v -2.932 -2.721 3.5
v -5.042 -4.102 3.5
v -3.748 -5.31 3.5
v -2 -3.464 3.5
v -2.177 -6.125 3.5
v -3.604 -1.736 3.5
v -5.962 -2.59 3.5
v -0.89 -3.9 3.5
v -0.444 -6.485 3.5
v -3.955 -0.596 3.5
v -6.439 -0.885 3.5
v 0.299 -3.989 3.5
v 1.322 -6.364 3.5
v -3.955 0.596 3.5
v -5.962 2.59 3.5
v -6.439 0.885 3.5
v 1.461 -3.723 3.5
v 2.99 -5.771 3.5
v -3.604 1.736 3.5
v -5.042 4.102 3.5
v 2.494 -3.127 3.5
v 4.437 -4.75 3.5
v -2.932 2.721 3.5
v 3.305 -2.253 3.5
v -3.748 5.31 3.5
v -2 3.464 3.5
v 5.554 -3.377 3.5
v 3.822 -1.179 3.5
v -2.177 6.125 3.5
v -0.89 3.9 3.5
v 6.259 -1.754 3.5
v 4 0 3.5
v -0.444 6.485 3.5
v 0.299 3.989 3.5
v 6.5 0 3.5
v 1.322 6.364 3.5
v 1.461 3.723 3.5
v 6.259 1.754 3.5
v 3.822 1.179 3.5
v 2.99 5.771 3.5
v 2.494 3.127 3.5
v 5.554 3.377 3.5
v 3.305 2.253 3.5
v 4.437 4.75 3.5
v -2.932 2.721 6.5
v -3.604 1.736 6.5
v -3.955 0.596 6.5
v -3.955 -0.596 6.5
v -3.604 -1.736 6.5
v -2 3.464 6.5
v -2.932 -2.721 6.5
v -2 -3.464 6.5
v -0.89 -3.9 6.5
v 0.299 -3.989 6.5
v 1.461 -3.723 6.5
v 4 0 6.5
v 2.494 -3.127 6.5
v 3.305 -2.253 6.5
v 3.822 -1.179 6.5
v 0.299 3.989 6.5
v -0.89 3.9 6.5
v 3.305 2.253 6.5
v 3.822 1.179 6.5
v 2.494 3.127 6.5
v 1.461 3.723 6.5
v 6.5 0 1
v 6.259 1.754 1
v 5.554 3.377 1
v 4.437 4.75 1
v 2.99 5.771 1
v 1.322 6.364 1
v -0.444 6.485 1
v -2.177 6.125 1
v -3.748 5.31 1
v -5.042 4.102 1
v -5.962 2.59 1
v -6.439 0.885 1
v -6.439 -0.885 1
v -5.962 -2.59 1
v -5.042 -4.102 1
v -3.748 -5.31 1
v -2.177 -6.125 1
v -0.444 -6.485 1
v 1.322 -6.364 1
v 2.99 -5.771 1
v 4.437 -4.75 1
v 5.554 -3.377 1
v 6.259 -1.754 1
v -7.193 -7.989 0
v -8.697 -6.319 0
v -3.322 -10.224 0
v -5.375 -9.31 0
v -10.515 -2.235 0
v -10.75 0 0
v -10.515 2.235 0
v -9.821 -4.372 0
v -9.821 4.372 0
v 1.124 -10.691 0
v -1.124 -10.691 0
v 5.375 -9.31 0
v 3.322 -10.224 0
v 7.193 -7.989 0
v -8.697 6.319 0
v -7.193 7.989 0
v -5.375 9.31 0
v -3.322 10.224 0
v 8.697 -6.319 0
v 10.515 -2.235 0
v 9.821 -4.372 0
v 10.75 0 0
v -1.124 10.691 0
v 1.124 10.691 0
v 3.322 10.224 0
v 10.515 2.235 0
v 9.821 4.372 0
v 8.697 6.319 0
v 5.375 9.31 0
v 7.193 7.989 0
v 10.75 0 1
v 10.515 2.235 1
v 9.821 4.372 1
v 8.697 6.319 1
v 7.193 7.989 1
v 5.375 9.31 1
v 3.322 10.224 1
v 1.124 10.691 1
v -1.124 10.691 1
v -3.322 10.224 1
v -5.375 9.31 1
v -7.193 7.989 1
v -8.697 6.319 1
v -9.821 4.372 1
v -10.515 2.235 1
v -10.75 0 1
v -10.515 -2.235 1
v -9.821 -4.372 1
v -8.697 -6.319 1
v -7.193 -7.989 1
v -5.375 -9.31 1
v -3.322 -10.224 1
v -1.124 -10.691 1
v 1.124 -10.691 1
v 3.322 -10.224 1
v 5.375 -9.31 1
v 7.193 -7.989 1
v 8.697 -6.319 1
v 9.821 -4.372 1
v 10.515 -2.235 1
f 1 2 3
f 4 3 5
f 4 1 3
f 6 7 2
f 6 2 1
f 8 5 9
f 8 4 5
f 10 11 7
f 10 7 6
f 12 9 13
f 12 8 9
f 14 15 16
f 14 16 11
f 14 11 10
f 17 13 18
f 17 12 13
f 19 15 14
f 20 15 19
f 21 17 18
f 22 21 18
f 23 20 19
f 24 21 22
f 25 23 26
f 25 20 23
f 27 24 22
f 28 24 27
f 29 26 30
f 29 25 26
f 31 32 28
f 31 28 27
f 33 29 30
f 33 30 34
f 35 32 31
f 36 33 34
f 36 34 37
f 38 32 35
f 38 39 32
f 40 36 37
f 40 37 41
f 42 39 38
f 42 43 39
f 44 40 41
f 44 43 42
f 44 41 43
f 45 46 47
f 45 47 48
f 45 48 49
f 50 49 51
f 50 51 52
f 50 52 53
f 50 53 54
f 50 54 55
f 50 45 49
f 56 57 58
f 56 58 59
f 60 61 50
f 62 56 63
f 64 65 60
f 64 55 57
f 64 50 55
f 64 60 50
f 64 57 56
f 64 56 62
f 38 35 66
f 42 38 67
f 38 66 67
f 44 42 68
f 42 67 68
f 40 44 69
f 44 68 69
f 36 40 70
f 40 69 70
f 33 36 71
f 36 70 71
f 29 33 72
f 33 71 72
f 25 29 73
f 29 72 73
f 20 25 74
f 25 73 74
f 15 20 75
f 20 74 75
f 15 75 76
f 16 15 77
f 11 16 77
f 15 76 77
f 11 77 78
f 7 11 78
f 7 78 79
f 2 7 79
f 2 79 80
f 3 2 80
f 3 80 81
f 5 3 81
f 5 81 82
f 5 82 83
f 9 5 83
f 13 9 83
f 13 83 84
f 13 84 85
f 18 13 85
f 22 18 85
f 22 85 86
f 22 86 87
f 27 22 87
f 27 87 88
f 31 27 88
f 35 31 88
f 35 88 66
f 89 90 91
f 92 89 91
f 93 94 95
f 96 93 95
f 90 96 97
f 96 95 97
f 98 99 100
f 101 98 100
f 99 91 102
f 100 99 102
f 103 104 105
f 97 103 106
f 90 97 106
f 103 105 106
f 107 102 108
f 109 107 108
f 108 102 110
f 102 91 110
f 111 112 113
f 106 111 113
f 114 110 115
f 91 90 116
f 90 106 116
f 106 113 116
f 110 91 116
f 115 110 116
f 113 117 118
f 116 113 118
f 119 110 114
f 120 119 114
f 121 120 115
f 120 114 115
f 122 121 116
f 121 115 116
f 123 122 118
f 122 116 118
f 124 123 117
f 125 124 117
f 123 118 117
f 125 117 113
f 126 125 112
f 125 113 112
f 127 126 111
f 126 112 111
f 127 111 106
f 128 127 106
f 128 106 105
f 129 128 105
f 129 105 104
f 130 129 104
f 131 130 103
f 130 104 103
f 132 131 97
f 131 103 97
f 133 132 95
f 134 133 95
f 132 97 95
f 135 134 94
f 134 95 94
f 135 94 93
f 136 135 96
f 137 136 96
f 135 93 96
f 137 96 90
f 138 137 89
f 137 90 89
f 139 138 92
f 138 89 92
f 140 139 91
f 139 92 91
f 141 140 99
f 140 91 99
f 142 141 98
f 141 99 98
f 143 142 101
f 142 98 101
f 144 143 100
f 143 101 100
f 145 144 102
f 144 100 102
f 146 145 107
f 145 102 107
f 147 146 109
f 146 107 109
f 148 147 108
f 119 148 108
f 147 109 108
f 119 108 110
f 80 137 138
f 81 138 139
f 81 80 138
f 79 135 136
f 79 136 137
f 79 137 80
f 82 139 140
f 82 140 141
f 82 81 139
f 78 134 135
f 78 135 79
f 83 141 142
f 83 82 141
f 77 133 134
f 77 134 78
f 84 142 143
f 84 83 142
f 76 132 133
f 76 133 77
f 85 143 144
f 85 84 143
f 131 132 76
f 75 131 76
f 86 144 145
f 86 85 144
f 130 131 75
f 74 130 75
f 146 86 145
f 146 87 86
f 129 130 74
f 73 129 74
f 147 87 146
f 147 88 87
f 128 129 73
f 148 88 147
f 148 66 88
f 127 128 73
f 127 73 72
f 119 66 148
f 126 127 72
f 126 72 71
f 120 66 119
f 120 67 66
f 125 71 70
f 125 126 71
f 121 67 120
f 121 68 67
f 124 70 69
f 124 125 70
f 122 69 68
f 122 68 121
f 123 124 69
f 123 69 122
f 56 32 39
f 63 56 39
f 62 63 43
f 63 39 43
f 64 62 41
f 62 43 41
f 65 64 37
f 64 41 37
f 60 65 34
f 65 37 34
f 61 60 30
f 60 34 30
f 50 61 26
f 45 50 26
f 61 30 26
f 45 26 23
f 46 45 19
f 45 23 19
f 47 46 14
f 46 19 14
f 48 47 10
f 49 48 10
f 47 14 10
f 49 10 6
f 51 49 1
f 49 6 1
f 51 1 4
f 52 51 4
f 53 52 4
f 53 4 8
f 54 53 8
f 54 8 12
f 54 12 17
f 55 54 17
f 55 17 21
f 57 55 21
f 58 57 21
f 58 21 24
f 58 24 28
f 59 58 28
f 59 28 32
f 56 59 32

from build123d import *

# Parameters (mm, degrees)
F0_R     = 10.75
F0_R_2   = 6.5
F0_R_3   = 4
F1_DEPTH = 1
F2_DEPTH = 3.5
F3_DEPTH = 6.5


with BuildPart() as f1:
    # F0 (on Top) → F1 (new body)
    with BuildSketch(Plane.XY):
        Circle(F0_R)
        Circle(F0_R_2, mode=Mode.SUBTRACT)
        Circle(F0_R_2)
        Circle(F0_R_3, mode=Mode.SUBTRACT)
        Circle(F0_R_3)
    extrude(amount=F1_DEPTH)

    # F0 (on Top) → F2 (join)
    with BuildSketch(Plane.XY):
        Circle(F0_R_2)
        Circle(F0_R_3, mode=Mode.SUBTRACT)
        Circle(F0_R_3)
    extrude(amount=F2_DEPTH)

    # F0 (on Top) → F3 (join)
    with BuildSketch(Plane.XY):
        Circle(F0_R_3)
    extrude(amount=F3_DEPTH)


solid = f1.part
